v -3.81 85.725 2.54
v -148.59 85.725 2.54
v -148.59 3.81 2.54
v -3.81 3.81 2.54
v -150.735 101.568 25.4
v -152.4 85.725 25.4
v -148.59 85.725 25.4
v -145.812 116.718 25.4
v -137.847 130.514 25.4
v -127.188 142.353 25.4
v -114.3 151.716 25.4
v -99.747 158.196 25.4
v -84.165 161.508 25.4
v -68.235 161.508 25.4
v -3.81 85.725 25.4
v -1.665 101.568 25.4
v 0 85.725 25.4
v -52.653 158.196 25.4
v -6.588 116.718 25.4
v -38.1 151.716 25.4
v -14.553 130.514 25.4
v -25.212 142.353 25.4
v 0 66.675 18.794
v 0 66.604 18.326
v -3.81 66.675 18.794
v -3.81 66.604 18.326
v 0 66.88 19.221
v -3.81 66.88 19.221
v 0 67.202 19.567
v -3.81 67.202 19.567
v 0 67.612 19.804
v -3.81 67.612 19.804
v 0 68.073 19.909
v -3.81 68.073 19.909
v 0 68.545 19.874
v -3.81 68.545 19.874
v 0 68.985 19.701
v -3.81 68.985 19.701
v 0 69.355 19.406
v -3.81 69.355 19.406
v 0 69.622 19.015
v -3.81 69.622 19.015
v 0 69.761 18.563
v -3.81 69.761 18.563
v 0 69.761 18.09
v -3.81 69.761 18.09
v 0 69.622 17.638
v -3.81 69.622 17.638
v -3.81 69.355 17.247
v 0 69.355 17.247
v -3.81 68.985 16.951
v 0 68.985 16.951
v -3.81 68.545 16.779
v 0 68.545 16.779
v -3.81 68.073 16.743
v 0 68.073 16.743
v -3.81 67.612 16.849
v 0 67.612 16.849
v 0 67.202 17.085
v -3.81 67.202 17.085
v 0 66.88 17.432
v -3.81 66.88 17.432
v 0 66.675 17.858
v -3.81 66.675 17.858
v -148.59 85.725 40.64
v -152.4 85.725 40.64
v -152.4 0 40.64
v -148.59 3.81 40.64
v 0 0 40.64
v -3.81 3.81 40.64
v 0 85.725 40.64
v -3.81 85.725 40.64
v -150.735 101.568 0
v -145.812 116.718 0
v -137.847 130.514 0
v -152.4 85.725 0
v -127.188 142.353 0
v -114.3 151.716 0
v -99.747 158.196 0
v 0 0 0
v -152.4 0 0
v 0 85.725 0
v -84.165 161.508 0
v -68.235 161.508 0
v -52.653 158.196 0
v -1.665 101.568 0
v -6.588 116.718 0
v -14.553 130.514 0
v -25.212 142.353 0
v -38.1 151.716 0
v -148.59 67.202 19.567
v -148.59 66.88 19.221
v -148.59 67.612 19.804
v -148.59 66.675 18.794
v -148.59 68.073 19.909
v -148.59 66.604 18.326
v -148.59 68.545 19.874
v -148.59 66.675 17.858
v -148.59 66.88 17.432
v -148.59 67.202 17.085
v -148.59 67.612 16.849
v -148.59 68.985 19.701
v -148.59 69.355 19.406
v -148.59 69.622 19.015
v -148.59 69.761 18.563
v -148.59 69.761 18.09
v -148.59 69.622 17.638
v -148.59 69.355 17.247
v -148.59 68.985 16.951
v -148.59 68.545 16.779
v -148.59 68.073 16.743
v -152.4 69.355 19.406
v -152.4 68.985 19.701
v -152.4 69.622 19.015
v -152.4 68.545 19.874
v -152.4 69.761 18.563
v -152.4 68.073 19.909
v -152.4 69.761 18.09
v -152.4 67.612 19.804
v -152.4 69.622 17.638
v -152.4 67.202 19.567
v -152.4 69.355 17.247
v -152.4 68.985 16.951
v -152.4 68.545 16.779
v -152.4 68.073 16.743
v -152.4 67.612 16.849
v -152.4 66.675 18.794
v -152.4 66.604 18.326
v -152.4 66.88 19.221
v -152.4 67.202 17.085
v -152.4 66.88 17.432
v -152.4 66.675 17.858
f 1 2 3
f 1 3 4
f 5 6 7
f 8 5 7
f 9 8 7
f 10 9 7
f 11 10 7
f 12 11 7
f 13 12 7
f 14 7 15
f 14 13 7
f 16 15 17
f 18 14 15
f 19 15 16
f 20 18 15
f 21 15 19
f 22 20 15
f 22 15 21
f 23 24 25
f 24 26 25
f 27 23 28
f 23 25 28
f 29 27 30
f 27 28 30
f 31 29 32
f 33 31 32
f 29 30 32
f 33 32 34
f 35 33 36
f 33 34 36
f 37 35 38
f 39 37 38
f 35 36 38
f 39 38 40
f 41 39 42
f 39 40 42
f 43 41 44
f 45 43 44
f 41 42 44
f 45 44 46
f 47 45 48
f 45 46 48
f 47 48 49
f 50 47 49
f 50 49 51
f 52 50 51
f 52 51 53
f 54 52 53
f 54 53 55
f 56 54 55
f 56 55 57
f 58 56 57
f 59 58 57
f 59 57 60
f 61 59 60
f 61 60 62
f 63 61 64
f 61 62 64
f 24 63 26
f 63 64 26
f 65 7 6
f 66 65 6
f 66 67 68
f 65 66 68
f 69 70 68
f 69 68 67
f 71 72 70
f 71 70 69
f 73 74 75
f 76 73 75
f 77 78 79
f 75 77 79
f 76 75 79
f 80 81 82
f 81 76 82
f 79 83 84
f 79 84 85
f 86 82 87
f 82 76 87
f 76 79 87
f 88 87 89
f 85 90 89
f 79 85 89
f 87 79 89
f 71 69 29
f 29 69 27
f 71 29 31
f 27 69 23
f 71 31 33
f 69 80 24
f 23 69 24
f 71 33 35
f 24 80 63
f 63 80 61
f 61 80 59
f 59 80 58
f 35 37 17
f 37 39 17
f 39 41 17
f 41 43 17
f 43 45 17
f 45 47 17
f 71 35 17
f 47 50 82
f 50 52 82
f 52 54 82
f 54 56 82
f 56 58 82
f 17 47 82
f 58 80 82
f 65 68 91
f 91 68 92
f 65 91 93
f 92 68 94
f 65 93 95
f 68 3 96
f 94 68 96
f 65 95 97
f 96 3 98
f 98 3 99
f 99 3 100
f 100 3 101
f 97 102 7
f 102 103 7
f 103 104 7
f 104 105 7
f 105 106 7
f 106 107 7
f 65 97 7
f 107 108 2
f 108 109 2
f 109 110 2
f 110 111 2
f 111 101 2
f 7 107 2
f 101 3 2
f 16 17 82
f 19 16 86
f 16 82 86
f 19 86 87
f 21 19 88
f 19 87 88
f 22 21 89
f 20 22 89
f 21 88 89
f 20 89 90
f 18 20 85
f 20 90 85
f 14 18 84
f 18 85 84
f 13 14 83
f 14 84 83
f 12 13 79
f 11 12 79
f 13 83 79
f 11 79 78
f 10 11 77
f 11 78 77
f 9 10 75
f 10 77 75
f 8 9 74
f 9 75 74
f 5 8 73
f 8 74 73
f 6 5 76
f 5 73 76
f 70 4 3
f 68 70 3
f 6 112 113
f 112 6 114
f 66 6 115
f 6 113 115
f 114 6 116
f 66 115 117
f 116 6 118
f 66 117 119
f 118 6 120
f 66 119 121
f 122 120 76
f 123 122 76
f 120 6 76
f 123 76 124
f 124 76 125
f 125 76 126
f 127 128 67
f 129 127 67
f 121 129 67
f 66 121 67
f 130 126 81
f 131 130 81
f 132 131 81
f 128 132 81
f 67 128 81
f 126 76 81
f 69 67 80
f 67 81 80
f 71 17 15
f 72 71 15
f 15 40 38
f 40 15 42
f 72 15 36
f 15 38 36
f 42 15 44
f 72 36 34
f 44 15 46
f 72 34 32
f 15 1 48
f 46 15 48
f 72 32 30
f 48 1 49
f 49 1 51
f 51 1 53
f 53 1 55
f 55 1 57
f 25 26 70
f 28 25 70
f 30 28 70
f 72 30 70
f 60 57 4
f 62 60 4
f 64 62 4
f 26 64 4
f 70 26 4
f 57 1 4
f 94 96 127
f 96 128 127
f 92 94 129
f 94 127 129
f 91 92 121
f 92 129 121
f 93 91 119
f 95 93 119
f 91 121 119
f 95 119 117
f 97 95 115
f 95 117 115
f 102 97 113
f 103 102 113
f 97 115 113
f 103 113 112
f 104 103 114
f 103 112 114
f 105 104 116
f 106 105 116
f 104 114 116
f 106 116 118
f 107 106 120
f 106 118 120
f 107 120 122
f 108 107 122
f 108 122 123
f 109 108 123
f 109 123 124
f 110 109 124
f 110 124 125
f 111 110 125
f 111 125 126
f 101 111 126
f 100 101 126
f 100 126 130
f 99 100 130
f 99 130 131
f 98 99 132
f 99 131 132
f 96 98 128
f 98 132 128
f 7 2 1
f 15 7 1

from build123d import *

# Parameters (mm, degrees)
F1_DEPTH = 2.54
F3_DEPTH = 22.86
F5_DEPTH = 38.1
F6_R     = 1.5875
F7_DEPTH = 254


with BuildPart() as f1:
    # F0 (on Top) → F1 (new body)
    with BuildSketch(Plane.XY):
        with BuildLine():
            Line((-152.4, 0), (0, 0))
            Line((0, 0), (0, 85.725))
            ThreePointArc((0, 85.725), (-76.2, 9.525), (-152.4, 85.725))
            Line((-152.4, 85.725), (-152.4, 0))
        make_face()
        with BuildLine():
            ThreePointArc((-152.4, 85.725), (-76.2, 9.525), (0, 85.725))
            Line((0, 85.725), (-152.4, 85.725))
        make_face()
        with BuildLine():
            Line((-152.4, 85.725), (0, 85.725))
            ThreePointArc((0, 85.725), (-76.2, 161.925), (-152.4, 85.725))
        make_face()
    extrude(amount=F1_DEPTH)

    # F2 (on face) → F3 (join)
    with BuildSketch(Plane.XY.offset(2.54)):
        with BuildLine():
            Line((-152.4, 85.725), (0, 85.725))
            ThreePointArc((0, 85.725), (-76.2, 161.925), (-152.4, 85.725))
        make_face()
    extrude(amount=F3_DEPTH)

    # F4 (on face) → F5 (join)
    with BuildSketch(Plane.XY.offset(2.54)):
        Polygon((-3.81, 3.81), (-148.59, 3.81), (-148.59, 85.725), (-152.4, 85.725), (-152.4, 0), (0, 0), (0, 85.725), (-3.81, 85.725), align=None)
    extrude(amount=F5_DEPTH)

    # F6 (on face) → F7 (cut, symmetric)
    with BuildSketch(Plane(origin=(-152.4, 0, 0), x_dir=(0, -1, 0), z_dir=(-1, 0, 0))):
        with Locations((-68.1915506721, 18.3263123035)):
            Circle(F6_R)
    extrude(amount=F7_DEPTH, both=True, mode=Mode.SUBTRACT)


solid = f1.part
